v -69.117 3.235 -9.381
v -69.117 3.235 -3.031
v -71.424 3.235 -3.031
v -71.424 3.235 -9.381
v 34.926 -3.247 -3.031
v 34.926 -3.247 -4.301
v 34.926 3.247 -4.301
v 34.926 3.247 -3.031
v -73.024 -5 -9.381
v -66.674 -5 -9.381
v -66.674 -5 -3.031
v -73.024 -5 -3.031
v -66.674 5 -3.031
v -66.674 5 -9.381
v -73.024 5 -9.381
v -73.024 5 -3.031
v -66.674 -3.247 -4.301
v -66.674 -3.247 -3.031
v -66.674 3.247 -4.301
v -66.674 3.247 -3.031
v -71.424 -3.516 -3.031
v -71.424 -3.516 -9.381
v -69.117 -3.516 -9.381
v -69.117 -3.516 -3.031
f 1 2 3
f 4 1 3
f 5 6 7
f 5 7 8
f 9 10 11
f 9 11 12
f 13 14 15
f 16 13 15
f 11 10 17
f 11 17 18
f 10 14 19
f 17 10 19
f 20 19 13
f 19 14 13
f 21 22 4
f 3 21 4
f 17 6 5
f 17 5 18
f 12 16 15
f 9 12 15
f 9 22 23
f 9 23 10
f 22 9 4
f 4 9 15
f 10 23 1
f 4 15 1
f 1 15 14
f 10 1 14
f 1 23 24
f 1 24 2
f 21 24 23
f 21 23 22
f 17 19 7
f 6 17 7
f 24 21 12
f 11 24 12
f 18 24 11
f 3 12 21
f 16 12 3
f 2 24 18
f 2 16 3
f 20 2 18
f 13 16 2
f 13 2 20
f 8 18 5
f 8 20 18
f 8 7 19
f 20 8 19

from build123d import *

# Parameters (mm, degrees)
BOSS_EXTRUDE1_DEPTH = 5
CUT_EXTRUDE1_REACH  = 75.47
SKETCH2_W           = 2.306675789
SKETCH2_H           = 6.75004694
CUT_EXTRUDE2_REACH  = 75.371
SKETCH3_W           = 101.6
SKETCH3_H           = 1.753256074


with BuildPart() as part:
    # Sketch1 → Boss-Extrude1 (new, symmetric)
    with BuildSketch(Plane(origin=(0, 0, 0), x_dir=(1, 0, 0), z_dir=(0, 1, 0))):
        Polygon((-73.023921726, 9.380838376), (-66.673921726, 9.380838376), (-66.673921726, 4.300838376), (34.926078274, 4.300838376), (34.926078274, 3.030838376), (-66.673921726, 3.030838376), (-73.023921726, 3.030838376), align=None)
    extrude(amount=BOSS_EXTRUDE1_DEPTH, both=True)

    # Sketch2 → Cut-Extrude1 (cut, up to next)
    with BuildSketch(Plane(origin=(0, 0, -9.380838376), x_dir=(-1, 0, 0), z_dir=(0, 0, -1)), mode=Mode.PRIVATE) as cut_extrude1_sk1:
        with Locations((70.270606821, -0.140509405)):
            Rectangle(SKETCH2_W, SKETCH2_H)
    cut_extrude1_tool1 = extrude(cut_extrude1_sk1.sketch, amount=-CUT_EXTRUDE1_REACH, mode=Mode.PRIVATE) & part.part
    add(cut_extrude1_tool1.solids().sort_by_distance((-70.270607, -0.140509, -9.380838))[0], mode=Mode.SUBTRACT)

    # Sketch3 → Cut-Extrude2 (cut, up to next)
    with BuildSketch(Plane(origin=(0, 0, -4.300838376), x_dir=(-1, 0, 0), z_dir=(0, 0, -1)), mode=Mode.PRIVATE) as cut_extrude2_sk1:
        with Locations((15.873921726, 4.123371963)):
            Rectangle(SKETCH3_W, SKETCH3_H)
    cut_extrude2_tool1 = extrude(cut_extrude2_sk1.sketch, amount=-CUT_EXTRUDE2_REACH, mode=Mode.PRIVATE) & part.part
    # Sketch3 → Cut-Extrude2 (cut, up to next)
    with BuildSketch(Plane(origin=(0, 0, -4.300838376), x_dir=(-1, 0, 0), z_dir=(0, 0, -1)), mode=Mode.PRIVATE) as cut_extrude2_sk2:
        with Locations((15.873921726, -4.123371963)):
            Rectangle(SKETCH3_W, SKETCH3_H)
    cut_extrude2_tool2 = extrude(cut_extrude2_sk2.sketch, amount=-CUT_EXTRUDE2_REACH, mode=Mode.PRIVATE) & part.part
    add(cut_extrude2_tool1.solids().sort_by_distance((-15.873922, 4.123372, -4.300838))[0], mode=Mode.SUBTRACT)
    add(cut_extrude2_tool2.solids().sort_by_distance((-15.873922, -4.123372, -4.300838))[0], mode=Mode.SUBTRACT)


solid = part.part
